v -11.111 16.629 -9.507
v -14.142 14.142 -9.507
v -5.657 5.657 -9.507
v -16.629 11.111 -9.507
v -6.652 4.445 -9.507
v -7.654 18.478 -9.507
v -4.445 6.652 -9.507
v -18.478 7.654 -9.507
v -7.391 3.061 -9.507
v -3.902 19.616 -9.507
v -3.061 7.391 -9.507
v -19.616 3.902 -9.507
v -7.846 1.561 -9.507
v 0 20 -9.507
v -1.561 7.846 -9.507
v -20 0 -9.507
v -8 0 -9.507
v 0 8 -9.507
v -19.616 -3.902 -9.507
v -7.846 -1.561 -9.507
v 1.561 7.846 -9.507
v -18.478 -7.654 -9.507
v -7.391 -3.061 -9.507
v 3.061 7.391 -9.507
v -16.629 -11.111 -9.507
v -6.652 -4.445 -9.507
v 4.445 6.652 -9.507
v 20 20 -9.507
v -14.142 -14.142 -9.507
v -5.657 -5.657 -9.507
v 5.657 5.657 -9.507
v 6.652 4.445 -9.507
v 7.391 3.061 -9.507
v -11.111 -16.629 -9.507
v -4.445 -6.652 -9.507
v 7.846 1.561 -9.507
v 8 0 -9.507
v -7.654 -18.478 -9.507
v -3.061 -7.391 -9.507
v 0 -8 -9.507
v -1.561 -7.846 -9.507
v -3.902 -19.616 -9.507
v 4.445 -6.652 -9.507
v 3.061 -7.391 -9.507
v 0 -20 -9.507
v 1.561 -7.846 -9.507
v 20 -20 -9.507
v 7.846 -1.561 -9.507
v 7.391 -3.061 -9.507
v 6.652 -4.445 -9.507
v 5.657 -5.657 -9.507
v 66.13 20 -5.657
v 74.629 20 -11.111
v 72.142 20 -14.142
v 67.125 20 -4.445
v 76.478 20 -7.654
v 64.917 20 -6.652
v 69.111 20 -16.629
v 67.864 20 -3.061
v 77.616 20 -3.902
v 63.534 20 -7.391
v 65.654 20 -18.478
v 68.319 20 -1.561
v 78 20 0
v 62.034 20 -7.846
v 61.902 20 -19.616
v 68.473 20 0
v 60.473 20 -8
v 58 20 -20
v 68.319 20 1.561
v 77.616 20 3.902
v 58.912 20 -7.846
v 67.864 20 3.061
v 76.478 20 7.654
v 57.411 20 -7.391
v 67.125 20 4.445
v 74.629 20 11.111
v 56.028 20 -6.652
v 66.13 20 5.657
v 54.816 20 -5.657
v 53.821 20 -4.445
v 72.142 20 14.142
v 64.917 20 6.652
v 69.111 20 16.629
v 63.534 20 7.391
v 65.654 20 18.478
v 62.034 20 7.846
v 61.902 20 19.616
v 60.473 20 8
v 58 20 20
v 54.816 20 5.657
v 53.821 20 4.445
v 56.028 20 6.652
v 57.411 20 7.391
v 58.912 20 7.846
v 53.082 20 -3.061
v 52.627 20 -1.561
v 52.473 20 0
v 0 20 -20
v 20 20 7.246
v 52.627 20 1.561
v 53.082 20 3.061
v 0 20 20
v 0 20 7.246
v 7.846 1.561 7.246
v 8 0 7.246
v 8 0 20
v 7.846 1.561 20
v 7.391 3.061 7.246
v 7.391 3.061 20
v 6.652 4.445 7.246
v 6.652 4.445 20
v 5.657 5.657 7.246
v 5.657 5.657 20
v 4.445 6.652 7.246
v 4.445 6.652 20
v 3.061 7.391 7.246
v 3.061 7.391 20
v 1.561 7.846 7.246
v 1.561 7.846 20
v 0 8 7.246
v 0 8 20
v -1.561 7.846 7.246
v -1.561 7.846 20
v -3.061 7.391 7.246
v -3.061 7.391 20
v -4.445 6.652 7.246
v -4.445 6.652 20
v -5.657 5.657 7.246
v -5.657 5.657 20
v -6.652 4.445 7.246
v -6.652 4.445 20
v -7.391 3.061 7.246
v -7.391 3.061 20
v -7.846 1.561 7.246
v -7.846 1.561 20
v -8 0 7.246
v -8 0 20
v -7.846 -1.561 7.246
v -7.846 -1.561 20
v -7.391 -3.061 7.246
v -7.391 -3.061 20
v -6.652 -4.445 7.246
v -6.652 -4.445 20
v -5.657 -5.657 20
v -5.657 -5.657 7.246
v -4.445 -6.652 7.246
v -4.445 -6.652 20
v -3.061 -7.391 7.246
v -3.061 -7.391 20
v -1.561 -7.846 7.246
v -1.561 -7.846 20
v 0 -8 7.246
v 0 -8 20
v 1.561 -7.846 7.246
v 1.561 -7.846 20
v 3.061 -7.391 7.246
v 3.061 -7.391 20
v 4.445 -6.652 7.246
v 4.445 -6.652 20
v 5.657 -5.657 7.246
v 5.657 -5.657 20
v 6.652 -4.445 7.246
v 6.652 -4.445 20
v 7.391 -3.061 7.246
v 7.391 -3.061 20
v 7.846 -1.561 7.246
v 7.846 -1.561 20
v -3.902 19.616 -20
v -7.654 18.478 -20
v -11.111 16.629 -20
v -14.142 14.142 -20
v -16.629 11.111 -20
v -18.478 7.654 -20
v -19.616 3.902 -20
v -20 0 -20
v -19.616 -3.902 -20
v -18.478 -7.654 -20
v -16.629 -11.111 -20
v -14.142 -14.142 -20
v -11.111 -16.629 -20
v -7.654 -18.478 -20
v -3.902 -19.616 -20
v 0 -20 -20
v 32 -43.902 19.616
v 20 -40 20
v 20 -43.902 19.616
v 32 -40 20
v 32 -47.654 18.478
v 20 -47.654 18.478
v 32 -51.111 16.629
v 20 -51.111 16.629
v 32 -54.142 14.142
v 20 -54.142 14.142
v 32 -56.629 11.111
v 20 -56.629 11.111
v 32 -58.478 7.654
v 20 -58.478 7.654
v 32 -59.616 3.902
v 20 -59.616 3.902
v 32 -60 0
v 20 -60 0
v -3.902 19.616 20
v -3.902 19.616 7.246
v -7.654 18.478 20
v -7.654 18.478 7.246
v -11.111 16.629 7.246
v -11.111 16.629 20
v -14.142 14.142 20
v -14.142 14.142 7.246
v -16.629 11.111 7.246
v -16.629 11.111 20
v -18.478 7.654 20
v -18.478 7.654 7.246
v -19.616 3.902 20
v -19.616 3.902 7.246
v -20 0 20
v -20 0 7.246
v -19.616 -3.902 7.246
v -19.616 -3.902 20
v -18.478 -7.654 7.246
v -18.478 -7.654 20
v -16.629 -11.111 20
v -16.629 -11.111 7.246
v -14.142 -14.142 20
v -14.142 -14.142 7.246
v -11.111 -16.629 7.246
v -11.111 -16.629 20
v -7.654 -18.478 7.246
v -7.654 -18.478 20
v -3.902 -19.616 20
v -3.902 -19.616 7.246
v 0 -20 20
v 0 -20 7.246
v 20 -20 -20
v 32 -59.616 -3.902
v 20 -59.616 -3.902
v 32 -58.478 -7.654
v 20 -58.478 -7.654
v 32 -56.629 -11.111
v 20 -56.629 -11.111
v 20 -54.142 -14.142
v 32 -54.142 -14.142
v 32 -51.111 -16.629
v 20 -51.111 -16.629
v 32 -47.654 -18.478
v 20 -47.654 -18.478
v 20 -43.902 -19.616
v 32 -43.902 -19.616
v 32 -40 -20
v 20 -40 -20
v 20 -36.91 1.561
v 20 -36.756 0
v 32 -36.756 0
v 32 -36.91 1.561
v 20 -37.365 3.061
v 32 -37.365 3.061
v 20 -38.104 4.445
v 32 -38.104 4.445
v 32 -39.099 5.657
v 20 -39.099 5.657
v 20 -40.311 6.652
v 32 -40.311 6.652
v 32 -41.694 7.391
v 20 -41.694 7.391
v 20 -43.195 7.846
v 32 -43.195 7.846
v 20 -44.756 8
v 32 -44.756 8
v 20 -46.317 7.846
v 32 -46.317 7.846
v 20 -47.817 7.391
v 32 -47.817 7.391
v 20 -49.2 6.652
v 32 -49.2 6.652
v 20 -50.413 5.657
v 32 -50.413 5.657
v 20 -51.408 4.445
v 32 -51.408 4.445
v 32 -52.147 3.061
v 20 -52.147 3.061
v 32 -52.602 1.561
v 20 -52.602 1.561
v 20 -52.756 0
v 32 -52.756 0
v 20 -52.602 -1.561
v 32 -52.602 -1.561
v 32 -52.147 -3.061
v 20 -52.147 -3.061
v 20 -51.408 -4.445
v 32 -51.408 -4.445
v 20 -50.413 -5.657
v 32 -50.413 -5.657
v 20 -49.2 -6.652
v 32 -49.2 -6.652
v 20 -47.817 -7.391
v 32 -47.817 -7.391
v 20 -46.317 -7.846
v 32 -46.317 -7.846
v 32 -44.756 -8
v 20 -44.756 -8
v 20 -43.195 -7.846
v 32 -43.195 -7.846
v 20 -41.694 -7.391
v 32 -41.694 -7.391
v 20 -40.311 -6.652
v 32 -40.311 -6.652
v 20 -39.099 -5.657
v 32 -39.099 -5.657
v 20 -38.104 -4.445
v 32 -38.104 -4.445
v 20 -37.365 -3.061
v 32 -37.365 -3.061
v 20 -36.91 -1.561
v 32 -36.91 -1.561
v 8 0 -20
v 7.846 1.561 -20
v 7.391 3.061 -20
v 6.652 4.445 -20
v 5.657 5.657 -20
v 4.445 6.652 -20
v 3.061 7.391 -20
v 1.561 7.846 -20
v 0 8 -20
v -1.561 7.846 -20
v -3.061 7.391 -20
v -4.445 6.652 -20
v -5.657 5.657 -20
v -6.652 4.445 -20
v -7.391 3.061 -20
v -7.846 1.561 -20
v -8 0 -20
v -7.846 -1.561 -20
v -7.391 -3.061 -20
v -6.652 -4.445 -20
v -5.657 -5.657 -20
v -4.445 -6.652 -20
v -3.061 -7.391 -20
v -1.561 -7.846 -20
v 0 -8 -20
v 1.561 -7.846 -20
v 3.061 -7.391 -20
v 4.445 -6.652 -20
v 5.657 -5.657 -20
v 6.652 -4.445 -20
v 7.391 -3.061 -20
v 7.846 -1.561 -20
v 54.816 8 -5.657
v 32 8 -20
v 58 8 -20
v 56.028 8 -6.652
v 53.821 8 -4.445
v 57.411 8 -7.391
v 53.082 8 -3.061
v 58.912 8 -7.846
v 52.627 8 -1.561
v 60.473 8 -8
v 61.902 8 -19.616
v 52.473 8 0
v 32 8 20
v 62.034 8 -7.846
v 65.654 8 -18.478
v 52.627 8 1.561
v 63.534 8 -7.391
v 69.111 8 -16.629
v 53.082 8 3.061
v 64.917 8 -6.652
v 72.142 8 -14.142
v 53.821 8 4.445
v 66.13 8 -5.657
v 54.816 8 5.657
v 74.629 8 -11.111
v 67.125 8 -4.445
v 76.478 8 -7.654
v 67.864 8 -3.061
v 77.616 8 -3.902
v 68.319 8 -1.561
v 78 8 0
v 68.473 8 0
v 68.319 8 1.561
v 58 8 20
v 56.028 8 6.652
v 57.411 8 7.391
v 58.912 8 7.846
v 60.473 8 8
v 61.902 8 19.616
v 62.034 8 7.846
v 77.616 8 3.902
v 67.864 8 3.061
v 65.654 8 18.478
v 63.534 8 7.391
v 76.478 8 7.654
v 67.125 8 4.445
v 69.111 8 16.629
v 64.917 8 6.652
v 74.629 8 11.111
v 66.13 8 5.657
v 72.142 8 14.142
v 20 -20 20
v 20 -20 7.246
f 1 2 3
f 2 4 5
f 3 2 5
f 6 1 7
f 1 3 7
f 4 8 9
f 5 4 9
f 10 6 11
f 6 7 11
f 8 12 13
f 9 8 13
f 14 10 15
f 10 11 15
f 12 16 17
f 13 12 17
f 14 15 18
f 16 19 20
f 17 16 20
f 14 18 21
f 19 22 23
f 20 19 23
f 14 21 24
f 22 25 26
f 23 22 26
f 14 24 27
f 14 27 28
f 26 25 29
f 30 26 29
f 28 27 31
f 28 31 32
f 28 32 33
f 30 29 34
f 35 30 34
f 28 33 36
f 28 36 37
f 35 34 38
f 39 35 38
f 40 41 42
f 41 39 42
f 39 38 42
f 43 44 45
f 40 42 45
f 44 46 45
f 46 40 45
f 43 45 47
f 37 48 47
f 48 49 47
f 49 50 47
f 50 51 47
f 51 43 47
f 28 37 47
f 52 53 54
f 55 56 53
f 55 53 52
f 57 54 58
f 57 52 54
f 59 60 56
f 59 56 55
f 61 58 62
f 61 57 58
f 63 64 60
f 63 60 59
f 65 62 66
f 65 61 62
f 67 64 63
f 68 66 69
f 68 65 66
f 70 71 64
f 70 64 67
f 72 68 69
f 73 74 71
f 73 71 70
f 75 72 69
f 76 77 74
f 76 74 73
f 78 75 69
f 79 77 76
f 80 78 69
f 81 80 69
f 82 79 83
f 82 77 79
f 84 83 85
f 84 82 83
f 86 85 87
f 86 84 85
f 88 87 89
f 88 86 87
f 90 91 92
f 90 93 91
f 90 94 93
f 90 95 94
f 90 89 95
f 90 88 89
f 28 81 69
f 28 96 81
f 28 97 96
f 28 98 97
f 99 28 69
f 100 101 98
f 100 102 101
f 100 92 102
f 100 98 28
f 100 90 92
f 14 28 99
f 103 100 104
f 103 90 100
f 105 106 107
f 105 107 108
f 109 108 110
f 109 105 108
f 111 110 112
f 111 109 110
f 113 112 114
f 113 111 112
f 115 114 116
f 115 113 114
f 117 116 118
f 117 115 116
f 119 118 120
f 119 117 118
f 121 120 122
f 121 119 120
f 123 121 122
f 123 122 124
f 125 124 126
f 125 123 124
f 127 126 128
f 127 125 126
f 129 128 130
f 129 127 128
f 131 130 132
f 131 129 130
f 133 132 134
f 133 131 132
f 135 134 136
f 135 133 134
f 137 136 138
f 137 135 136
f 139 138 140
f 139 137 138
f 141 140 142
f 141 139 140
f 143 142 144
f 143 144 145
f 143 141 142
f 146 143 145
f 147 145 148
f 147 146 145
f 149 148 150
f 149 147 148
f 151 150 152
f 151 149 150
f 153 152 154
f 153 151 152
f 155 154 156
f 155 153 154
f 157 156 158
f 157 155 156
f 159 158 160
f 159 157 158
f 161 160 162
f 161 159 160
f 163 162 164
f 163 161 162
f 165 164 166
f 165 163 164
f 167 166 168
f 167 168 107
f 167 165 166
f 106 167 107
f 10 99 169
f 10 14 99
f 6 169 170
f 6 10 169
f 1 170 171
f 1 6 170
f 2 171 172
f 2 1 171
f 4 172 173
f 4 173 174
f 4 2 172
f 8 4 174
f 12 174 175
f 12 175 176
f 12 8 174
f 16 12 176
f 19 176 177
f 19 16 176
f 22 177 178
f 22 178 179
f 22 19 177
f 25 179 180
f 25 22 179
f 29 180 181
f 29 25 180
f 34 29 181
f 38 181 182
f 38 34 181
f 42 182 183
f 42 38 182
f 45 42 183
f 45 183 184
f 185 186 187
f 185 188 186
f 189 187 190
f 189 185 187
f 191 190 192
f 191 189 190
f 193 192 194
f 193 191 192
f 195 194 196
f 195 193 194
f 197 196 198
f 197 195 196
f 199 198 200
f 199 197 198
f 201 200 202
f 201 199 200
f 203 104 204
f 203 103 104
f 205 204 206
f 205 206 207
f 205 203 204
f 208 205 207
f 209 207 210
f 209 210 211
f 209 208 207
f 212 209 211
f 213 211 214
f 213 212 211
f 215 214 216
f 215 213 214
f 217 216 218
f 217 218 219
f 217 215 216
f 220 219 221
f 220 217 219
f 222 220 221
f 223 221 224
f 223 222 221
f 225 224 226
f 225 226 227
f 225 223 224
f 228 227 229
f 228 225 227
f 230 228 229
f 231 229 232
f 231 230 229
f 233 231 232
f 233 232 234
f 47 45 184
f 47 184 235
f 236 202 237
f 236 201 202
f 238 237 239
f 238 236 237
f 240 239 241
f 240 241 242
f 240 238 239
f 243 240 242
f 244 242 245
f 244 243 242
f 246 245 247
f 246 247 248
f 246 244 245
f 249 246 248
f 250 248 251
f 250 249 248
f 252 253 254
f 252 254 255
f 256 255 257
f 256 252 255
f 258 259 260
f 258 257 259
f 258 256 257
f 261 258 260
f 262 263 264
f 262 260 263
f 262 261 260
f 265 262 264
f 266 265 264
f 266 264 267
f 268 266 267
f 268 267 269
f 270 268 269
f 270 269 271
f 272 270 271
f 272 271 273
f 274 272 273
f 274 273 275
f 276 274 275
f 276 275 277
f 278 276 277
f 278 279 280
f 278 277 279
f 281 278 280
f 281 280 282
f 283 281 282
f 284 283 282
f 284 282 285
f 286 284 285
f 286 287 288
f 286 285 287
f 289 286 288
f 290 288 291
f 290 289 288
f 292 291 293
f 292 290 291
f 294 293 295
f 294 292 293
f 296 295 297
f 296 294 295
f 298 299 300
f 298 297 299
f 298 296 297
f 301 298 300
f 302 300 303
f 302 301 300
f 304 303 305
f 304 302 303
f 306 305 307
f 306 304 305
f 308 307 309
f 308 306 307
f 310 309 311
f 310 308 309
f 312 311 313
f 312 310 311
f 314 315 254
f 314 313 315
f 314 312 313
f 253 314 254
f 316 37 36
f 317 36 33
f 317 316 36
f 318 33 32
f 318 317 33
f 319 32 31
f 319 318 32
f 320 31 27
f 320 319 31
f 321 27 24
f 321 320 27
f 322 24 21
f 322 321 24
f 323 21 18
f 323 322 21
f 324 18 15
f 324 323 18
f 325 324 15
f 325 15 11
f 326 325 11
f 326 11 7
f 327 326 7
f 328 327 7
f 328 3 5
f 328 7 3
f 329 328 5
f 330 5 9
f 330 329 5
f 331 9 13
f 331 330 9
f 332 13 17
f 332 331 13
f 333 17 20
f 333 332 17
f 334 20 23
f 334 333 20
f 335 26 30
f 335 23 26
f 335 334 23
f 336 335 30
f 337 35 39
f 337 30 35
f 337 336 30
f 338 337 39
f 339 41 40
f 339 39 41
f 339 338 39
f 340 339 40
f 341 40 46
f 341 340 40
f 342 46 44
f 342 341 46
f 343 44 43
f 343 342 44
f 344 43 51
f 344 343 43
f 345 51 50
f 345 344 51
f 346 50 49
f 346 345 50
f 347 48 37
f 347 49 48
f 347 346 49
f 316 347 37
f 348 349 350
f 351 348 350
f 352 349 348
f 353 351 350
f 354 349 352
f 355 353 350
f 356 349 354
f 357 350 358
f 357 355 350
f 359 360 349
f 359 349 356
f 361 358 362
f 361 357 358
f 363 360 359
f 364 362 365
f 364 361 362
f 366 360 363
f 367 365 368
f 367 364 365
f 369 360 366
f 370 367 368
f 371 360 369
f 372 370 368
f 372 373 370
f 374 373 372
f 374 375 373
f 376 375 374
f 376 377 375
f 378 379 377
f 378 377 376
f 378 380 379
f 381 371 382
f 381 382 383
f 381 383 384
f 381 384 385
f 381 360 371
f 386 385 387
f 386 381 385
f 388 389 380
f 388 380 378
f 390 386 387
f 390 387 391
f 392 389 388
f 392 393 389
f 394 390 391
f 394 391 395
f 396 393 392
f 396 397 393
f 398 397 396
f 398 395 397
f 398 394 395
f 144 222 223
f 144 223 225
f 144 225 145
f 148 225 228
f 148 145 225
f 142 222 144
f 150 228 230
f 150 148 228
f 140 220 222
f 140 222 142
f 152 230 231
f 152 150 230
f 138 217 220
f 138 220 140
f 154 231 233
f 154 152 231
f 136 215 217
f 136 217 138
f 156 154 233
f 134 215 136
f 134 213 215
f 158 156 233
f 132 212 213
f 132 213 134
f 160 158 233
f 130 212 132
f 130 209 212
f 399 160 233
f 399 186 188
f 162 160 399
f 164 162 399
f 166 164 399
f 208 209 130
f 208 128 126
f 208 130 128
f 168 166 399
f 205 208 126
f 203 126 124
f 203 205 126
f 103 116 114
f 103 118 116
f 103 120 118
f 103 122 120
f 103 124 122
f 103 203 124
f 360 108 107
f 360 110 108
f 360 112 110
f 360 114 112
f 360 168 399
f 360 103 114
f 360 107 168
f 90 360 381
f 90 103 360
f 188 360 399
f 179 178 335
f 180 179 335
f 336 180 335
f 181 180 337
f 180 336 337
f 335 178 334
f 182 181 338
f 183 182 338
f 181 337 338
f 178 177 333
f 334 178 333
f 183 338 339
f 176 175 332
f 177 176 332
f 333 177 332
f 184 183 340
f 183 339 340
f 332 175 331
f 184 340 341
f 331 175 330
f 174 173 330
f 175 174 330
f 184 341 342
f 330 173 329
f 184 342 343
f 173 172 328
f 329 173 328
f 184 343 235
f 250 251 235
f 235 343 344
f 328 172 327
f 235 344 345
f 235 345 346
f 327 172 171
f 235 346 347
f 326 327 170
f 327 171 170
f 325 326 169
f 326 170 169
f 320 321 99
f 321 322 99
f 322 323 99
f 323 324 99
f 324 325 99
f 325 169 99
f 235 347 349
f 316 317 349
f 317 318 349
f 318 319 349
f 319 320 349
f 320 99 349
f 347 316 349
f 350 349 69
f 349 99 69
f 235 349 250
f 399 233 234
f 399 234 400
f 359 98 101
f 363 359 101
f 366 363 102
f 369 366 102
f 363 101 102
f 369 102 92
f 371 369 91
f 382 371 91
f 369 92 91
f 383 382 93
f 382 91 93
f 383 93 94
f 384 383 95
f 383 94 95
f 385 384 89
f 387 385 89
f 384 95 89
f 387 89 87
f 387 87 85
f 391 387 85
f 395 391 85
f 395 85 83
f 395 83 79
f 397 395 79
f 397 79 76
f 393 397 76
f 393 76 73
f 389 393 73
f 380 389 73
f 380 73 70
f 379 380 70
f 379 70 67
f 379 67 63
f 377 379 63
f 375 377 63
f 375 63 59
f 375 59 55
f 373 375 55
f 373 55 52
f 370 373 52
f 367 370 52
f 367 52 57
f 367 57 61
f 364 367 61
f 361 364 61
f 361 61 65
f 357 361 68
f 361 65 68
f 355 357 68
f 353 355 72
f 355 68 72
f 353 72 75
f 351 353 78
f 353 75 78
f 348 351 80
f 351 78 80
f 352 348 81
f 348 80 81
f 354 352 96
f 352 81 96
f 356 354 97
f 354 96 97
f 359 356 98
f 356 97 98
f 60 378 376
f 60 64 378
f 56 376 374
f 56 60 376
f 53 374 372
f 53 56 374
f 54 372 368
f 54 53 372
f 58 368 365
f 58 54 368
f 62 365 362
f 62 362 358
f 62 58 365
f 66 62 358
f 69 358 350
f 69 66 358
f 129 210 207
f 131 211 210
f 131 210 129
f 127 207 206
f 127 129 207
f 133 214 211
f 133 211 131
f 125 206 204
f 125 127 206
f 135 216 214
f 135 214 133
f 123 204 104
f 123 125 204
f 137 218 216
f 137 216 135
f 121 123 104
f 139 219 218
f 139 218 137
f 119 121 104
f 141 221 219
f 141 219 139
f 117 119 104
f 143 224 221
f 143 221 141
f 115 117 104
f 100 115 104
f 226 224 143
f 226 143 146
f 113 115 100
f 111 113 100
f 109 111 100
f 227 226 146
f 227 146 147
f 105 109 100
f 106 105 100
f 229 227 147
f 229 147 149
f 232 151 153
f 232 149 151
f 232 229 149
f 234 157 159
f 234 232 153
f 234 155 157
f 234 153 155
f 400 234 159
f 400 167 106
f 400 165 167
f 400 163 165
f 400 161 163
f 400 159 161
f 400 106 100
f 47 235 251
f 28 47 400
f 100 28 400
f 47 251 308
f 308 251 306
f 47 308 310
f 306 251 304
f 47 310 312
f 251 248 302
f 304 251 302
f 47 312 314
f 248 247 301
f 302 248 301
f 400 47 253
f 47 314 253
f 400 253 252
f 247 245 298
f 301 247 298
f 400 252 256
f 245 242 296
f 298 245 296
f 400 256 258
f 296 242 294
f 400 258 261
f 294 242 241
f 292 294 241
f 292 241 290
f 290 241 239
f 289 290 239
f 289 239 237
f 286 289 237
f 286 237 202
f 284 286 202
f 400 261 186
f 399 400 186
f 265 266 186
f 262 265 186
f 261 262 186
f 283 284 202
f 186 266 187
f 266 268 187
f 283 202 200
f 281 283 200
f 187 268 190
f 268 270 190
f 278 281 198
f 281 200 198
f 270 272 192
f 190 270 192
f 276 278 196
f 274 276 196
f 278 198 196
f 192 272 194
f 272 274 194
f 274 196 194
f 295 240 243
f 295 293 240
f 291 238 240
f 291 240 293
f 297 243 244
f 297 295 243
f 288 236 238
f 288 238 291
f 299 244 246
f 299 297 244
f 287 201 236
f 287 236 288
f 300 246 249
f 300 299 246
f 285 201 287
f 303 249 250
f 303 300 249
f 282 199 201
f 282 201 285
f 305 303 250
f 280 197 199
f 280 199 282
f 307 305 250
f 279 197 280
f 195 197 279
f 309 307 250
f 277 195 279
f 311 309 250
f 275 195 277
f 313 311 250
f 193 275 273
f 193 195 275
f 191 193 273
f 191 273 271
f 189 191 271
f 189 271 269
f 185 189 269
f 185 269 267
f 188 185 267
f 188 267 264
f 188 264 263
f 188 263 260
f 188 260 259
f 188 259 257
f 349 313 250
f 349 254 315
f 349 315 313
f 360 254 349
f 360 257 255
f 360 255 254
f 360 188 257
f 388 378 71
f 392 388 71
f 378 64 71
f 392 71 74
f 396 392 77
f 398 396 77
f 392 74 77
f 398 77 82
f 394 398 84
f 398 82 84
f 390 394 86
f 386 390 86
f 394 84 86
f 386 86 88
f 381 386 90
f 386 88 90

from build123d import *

# Parameters (mm, degrees)
SKETCH1_R               = 20
SKETCH1_R_2             = 8
BOSS_EXTRUDE1_DEPTH     = 20
FILLET1_R               = 20
SKETCH2_R               = 8
CUT_EXTRUDE2_DEPTH      = 16
SKETCH3_W               = 74.438735145
SKETCH3_H               = 16.753132604
CUT_EXTRUDE3_DEPTH      = 90.911067172
FILLET2_R               = 20
FILLET3_R               = 20
CUT_EXTRUDE4_DEPTH      = 82.877957962
CUT_EXTRUDE4_DEPTH_BACK = 82.877957962
SKETCH4_R               = 8


with BuildPart() as part:
    # Sketch1 → Boss-Extrude1 (new, symmetric)
    # profile 1 of 2: a face of its own
    with BuildSketch(Plane.XY):
        Circle(SKETCH1_R)
        Circle(SKETCH1_R_2, mode=Mode.SUBTRACT)
    # profile 2 of 2: a face of its own
    with BuildSketch(Plane.XY):
        with BuildLine():
            Line((78, 20), (0, 20))
            ThreePointArc((0, 20), (14.142135624, 14.142135624), (20, 0))
            ThreePointArc((20, 0), (14.142135624, -14.142135624), (0, -20))
            Line((0, -20), (20, -20))
            Line((20, -20), (20, -60))
            Line((20, -60), (32, -60))
            Line((32, -60), (32, 8))
            Line((32, 8), (78, 8))
            Line((78, 8), (78, 20))
        make_face()
    extrude(amount=BOSS_EXTRUDE1_DEPTH, both=True)

    # Fillet1
    fillet1_edges = [part.edges().sort_by_distance(p)[0] for p in [
        (78, 14, -20),
        (78, 14, 20),
    ]]
    fillet(fillet1_edges, radius=FILLET1_R - 0.0001)  # a hair under: the kernel refuses the full size

    # Sketch2 → Cut-Extrude2 (cut)
    with BuildSketch(Plane(origin=(0, 20, 0), x_dir=(1, 0, 0), z_dir=(0, 1, 0))):
        with Locations(Location((60.472902104, 0, 0), (0, 0, 180))):
            Circle(SKETCH2_R)
    extrude(amount=-CUT_EXTRUDE2_DEPTH, mode=Mode.SUBTRACT)

    # Sketch3 → Cut-Extrude3 (cut, through all)
    with BuildSketch(Plane.XZ.offset(20)):
        with Locations((-17.219367573, -1.130171644)):
            Rectangle(SKETCH3_W, SKETCH3_H)
    extrude(amount=-CUT_EXTRUDE3_DEPTH, mode=Mode.SUBTRACT)

    # Fillet2
    fillet2_edges = [part.edges().sort_by_distance(p)[0] for p in [
        (26, -60, 20),
    ]]
    fillet(fillet2_edges, radius=FILLET2_R)

    # Fillet3
    fillet3_edges = [part.edges().sort_by_distance(p)[0] for p in [
        (26, -60, -20),
    ]]
    fillet(fillet3_edges, radius=FILLET3_R - 0.0001)  # a hair under: the kernel refuses the full size

    # Sketch4 → Cut-Extrude4 (cut, two sides: drawn at the far end of the back side and taken through both)
    with BuildSketch(Plane(origin=(32, 0, 0), x_dir=(0, 0, -1), z_dir=(1, 0, 0)).offset(-CUT_EXTRUDE4_DEPTH_BACK)):
        with Locations(Location((0, -44.755854097, 0), (0, 0, 90))):
            Circle(SKETCH4_R)
    extrude(amount=CUT_EXTRUDE4_DEPTH + CUT_EXTRUDE4_DEPTH_BACK, mode=Mode.SUBTRACT)


solid = part.part
